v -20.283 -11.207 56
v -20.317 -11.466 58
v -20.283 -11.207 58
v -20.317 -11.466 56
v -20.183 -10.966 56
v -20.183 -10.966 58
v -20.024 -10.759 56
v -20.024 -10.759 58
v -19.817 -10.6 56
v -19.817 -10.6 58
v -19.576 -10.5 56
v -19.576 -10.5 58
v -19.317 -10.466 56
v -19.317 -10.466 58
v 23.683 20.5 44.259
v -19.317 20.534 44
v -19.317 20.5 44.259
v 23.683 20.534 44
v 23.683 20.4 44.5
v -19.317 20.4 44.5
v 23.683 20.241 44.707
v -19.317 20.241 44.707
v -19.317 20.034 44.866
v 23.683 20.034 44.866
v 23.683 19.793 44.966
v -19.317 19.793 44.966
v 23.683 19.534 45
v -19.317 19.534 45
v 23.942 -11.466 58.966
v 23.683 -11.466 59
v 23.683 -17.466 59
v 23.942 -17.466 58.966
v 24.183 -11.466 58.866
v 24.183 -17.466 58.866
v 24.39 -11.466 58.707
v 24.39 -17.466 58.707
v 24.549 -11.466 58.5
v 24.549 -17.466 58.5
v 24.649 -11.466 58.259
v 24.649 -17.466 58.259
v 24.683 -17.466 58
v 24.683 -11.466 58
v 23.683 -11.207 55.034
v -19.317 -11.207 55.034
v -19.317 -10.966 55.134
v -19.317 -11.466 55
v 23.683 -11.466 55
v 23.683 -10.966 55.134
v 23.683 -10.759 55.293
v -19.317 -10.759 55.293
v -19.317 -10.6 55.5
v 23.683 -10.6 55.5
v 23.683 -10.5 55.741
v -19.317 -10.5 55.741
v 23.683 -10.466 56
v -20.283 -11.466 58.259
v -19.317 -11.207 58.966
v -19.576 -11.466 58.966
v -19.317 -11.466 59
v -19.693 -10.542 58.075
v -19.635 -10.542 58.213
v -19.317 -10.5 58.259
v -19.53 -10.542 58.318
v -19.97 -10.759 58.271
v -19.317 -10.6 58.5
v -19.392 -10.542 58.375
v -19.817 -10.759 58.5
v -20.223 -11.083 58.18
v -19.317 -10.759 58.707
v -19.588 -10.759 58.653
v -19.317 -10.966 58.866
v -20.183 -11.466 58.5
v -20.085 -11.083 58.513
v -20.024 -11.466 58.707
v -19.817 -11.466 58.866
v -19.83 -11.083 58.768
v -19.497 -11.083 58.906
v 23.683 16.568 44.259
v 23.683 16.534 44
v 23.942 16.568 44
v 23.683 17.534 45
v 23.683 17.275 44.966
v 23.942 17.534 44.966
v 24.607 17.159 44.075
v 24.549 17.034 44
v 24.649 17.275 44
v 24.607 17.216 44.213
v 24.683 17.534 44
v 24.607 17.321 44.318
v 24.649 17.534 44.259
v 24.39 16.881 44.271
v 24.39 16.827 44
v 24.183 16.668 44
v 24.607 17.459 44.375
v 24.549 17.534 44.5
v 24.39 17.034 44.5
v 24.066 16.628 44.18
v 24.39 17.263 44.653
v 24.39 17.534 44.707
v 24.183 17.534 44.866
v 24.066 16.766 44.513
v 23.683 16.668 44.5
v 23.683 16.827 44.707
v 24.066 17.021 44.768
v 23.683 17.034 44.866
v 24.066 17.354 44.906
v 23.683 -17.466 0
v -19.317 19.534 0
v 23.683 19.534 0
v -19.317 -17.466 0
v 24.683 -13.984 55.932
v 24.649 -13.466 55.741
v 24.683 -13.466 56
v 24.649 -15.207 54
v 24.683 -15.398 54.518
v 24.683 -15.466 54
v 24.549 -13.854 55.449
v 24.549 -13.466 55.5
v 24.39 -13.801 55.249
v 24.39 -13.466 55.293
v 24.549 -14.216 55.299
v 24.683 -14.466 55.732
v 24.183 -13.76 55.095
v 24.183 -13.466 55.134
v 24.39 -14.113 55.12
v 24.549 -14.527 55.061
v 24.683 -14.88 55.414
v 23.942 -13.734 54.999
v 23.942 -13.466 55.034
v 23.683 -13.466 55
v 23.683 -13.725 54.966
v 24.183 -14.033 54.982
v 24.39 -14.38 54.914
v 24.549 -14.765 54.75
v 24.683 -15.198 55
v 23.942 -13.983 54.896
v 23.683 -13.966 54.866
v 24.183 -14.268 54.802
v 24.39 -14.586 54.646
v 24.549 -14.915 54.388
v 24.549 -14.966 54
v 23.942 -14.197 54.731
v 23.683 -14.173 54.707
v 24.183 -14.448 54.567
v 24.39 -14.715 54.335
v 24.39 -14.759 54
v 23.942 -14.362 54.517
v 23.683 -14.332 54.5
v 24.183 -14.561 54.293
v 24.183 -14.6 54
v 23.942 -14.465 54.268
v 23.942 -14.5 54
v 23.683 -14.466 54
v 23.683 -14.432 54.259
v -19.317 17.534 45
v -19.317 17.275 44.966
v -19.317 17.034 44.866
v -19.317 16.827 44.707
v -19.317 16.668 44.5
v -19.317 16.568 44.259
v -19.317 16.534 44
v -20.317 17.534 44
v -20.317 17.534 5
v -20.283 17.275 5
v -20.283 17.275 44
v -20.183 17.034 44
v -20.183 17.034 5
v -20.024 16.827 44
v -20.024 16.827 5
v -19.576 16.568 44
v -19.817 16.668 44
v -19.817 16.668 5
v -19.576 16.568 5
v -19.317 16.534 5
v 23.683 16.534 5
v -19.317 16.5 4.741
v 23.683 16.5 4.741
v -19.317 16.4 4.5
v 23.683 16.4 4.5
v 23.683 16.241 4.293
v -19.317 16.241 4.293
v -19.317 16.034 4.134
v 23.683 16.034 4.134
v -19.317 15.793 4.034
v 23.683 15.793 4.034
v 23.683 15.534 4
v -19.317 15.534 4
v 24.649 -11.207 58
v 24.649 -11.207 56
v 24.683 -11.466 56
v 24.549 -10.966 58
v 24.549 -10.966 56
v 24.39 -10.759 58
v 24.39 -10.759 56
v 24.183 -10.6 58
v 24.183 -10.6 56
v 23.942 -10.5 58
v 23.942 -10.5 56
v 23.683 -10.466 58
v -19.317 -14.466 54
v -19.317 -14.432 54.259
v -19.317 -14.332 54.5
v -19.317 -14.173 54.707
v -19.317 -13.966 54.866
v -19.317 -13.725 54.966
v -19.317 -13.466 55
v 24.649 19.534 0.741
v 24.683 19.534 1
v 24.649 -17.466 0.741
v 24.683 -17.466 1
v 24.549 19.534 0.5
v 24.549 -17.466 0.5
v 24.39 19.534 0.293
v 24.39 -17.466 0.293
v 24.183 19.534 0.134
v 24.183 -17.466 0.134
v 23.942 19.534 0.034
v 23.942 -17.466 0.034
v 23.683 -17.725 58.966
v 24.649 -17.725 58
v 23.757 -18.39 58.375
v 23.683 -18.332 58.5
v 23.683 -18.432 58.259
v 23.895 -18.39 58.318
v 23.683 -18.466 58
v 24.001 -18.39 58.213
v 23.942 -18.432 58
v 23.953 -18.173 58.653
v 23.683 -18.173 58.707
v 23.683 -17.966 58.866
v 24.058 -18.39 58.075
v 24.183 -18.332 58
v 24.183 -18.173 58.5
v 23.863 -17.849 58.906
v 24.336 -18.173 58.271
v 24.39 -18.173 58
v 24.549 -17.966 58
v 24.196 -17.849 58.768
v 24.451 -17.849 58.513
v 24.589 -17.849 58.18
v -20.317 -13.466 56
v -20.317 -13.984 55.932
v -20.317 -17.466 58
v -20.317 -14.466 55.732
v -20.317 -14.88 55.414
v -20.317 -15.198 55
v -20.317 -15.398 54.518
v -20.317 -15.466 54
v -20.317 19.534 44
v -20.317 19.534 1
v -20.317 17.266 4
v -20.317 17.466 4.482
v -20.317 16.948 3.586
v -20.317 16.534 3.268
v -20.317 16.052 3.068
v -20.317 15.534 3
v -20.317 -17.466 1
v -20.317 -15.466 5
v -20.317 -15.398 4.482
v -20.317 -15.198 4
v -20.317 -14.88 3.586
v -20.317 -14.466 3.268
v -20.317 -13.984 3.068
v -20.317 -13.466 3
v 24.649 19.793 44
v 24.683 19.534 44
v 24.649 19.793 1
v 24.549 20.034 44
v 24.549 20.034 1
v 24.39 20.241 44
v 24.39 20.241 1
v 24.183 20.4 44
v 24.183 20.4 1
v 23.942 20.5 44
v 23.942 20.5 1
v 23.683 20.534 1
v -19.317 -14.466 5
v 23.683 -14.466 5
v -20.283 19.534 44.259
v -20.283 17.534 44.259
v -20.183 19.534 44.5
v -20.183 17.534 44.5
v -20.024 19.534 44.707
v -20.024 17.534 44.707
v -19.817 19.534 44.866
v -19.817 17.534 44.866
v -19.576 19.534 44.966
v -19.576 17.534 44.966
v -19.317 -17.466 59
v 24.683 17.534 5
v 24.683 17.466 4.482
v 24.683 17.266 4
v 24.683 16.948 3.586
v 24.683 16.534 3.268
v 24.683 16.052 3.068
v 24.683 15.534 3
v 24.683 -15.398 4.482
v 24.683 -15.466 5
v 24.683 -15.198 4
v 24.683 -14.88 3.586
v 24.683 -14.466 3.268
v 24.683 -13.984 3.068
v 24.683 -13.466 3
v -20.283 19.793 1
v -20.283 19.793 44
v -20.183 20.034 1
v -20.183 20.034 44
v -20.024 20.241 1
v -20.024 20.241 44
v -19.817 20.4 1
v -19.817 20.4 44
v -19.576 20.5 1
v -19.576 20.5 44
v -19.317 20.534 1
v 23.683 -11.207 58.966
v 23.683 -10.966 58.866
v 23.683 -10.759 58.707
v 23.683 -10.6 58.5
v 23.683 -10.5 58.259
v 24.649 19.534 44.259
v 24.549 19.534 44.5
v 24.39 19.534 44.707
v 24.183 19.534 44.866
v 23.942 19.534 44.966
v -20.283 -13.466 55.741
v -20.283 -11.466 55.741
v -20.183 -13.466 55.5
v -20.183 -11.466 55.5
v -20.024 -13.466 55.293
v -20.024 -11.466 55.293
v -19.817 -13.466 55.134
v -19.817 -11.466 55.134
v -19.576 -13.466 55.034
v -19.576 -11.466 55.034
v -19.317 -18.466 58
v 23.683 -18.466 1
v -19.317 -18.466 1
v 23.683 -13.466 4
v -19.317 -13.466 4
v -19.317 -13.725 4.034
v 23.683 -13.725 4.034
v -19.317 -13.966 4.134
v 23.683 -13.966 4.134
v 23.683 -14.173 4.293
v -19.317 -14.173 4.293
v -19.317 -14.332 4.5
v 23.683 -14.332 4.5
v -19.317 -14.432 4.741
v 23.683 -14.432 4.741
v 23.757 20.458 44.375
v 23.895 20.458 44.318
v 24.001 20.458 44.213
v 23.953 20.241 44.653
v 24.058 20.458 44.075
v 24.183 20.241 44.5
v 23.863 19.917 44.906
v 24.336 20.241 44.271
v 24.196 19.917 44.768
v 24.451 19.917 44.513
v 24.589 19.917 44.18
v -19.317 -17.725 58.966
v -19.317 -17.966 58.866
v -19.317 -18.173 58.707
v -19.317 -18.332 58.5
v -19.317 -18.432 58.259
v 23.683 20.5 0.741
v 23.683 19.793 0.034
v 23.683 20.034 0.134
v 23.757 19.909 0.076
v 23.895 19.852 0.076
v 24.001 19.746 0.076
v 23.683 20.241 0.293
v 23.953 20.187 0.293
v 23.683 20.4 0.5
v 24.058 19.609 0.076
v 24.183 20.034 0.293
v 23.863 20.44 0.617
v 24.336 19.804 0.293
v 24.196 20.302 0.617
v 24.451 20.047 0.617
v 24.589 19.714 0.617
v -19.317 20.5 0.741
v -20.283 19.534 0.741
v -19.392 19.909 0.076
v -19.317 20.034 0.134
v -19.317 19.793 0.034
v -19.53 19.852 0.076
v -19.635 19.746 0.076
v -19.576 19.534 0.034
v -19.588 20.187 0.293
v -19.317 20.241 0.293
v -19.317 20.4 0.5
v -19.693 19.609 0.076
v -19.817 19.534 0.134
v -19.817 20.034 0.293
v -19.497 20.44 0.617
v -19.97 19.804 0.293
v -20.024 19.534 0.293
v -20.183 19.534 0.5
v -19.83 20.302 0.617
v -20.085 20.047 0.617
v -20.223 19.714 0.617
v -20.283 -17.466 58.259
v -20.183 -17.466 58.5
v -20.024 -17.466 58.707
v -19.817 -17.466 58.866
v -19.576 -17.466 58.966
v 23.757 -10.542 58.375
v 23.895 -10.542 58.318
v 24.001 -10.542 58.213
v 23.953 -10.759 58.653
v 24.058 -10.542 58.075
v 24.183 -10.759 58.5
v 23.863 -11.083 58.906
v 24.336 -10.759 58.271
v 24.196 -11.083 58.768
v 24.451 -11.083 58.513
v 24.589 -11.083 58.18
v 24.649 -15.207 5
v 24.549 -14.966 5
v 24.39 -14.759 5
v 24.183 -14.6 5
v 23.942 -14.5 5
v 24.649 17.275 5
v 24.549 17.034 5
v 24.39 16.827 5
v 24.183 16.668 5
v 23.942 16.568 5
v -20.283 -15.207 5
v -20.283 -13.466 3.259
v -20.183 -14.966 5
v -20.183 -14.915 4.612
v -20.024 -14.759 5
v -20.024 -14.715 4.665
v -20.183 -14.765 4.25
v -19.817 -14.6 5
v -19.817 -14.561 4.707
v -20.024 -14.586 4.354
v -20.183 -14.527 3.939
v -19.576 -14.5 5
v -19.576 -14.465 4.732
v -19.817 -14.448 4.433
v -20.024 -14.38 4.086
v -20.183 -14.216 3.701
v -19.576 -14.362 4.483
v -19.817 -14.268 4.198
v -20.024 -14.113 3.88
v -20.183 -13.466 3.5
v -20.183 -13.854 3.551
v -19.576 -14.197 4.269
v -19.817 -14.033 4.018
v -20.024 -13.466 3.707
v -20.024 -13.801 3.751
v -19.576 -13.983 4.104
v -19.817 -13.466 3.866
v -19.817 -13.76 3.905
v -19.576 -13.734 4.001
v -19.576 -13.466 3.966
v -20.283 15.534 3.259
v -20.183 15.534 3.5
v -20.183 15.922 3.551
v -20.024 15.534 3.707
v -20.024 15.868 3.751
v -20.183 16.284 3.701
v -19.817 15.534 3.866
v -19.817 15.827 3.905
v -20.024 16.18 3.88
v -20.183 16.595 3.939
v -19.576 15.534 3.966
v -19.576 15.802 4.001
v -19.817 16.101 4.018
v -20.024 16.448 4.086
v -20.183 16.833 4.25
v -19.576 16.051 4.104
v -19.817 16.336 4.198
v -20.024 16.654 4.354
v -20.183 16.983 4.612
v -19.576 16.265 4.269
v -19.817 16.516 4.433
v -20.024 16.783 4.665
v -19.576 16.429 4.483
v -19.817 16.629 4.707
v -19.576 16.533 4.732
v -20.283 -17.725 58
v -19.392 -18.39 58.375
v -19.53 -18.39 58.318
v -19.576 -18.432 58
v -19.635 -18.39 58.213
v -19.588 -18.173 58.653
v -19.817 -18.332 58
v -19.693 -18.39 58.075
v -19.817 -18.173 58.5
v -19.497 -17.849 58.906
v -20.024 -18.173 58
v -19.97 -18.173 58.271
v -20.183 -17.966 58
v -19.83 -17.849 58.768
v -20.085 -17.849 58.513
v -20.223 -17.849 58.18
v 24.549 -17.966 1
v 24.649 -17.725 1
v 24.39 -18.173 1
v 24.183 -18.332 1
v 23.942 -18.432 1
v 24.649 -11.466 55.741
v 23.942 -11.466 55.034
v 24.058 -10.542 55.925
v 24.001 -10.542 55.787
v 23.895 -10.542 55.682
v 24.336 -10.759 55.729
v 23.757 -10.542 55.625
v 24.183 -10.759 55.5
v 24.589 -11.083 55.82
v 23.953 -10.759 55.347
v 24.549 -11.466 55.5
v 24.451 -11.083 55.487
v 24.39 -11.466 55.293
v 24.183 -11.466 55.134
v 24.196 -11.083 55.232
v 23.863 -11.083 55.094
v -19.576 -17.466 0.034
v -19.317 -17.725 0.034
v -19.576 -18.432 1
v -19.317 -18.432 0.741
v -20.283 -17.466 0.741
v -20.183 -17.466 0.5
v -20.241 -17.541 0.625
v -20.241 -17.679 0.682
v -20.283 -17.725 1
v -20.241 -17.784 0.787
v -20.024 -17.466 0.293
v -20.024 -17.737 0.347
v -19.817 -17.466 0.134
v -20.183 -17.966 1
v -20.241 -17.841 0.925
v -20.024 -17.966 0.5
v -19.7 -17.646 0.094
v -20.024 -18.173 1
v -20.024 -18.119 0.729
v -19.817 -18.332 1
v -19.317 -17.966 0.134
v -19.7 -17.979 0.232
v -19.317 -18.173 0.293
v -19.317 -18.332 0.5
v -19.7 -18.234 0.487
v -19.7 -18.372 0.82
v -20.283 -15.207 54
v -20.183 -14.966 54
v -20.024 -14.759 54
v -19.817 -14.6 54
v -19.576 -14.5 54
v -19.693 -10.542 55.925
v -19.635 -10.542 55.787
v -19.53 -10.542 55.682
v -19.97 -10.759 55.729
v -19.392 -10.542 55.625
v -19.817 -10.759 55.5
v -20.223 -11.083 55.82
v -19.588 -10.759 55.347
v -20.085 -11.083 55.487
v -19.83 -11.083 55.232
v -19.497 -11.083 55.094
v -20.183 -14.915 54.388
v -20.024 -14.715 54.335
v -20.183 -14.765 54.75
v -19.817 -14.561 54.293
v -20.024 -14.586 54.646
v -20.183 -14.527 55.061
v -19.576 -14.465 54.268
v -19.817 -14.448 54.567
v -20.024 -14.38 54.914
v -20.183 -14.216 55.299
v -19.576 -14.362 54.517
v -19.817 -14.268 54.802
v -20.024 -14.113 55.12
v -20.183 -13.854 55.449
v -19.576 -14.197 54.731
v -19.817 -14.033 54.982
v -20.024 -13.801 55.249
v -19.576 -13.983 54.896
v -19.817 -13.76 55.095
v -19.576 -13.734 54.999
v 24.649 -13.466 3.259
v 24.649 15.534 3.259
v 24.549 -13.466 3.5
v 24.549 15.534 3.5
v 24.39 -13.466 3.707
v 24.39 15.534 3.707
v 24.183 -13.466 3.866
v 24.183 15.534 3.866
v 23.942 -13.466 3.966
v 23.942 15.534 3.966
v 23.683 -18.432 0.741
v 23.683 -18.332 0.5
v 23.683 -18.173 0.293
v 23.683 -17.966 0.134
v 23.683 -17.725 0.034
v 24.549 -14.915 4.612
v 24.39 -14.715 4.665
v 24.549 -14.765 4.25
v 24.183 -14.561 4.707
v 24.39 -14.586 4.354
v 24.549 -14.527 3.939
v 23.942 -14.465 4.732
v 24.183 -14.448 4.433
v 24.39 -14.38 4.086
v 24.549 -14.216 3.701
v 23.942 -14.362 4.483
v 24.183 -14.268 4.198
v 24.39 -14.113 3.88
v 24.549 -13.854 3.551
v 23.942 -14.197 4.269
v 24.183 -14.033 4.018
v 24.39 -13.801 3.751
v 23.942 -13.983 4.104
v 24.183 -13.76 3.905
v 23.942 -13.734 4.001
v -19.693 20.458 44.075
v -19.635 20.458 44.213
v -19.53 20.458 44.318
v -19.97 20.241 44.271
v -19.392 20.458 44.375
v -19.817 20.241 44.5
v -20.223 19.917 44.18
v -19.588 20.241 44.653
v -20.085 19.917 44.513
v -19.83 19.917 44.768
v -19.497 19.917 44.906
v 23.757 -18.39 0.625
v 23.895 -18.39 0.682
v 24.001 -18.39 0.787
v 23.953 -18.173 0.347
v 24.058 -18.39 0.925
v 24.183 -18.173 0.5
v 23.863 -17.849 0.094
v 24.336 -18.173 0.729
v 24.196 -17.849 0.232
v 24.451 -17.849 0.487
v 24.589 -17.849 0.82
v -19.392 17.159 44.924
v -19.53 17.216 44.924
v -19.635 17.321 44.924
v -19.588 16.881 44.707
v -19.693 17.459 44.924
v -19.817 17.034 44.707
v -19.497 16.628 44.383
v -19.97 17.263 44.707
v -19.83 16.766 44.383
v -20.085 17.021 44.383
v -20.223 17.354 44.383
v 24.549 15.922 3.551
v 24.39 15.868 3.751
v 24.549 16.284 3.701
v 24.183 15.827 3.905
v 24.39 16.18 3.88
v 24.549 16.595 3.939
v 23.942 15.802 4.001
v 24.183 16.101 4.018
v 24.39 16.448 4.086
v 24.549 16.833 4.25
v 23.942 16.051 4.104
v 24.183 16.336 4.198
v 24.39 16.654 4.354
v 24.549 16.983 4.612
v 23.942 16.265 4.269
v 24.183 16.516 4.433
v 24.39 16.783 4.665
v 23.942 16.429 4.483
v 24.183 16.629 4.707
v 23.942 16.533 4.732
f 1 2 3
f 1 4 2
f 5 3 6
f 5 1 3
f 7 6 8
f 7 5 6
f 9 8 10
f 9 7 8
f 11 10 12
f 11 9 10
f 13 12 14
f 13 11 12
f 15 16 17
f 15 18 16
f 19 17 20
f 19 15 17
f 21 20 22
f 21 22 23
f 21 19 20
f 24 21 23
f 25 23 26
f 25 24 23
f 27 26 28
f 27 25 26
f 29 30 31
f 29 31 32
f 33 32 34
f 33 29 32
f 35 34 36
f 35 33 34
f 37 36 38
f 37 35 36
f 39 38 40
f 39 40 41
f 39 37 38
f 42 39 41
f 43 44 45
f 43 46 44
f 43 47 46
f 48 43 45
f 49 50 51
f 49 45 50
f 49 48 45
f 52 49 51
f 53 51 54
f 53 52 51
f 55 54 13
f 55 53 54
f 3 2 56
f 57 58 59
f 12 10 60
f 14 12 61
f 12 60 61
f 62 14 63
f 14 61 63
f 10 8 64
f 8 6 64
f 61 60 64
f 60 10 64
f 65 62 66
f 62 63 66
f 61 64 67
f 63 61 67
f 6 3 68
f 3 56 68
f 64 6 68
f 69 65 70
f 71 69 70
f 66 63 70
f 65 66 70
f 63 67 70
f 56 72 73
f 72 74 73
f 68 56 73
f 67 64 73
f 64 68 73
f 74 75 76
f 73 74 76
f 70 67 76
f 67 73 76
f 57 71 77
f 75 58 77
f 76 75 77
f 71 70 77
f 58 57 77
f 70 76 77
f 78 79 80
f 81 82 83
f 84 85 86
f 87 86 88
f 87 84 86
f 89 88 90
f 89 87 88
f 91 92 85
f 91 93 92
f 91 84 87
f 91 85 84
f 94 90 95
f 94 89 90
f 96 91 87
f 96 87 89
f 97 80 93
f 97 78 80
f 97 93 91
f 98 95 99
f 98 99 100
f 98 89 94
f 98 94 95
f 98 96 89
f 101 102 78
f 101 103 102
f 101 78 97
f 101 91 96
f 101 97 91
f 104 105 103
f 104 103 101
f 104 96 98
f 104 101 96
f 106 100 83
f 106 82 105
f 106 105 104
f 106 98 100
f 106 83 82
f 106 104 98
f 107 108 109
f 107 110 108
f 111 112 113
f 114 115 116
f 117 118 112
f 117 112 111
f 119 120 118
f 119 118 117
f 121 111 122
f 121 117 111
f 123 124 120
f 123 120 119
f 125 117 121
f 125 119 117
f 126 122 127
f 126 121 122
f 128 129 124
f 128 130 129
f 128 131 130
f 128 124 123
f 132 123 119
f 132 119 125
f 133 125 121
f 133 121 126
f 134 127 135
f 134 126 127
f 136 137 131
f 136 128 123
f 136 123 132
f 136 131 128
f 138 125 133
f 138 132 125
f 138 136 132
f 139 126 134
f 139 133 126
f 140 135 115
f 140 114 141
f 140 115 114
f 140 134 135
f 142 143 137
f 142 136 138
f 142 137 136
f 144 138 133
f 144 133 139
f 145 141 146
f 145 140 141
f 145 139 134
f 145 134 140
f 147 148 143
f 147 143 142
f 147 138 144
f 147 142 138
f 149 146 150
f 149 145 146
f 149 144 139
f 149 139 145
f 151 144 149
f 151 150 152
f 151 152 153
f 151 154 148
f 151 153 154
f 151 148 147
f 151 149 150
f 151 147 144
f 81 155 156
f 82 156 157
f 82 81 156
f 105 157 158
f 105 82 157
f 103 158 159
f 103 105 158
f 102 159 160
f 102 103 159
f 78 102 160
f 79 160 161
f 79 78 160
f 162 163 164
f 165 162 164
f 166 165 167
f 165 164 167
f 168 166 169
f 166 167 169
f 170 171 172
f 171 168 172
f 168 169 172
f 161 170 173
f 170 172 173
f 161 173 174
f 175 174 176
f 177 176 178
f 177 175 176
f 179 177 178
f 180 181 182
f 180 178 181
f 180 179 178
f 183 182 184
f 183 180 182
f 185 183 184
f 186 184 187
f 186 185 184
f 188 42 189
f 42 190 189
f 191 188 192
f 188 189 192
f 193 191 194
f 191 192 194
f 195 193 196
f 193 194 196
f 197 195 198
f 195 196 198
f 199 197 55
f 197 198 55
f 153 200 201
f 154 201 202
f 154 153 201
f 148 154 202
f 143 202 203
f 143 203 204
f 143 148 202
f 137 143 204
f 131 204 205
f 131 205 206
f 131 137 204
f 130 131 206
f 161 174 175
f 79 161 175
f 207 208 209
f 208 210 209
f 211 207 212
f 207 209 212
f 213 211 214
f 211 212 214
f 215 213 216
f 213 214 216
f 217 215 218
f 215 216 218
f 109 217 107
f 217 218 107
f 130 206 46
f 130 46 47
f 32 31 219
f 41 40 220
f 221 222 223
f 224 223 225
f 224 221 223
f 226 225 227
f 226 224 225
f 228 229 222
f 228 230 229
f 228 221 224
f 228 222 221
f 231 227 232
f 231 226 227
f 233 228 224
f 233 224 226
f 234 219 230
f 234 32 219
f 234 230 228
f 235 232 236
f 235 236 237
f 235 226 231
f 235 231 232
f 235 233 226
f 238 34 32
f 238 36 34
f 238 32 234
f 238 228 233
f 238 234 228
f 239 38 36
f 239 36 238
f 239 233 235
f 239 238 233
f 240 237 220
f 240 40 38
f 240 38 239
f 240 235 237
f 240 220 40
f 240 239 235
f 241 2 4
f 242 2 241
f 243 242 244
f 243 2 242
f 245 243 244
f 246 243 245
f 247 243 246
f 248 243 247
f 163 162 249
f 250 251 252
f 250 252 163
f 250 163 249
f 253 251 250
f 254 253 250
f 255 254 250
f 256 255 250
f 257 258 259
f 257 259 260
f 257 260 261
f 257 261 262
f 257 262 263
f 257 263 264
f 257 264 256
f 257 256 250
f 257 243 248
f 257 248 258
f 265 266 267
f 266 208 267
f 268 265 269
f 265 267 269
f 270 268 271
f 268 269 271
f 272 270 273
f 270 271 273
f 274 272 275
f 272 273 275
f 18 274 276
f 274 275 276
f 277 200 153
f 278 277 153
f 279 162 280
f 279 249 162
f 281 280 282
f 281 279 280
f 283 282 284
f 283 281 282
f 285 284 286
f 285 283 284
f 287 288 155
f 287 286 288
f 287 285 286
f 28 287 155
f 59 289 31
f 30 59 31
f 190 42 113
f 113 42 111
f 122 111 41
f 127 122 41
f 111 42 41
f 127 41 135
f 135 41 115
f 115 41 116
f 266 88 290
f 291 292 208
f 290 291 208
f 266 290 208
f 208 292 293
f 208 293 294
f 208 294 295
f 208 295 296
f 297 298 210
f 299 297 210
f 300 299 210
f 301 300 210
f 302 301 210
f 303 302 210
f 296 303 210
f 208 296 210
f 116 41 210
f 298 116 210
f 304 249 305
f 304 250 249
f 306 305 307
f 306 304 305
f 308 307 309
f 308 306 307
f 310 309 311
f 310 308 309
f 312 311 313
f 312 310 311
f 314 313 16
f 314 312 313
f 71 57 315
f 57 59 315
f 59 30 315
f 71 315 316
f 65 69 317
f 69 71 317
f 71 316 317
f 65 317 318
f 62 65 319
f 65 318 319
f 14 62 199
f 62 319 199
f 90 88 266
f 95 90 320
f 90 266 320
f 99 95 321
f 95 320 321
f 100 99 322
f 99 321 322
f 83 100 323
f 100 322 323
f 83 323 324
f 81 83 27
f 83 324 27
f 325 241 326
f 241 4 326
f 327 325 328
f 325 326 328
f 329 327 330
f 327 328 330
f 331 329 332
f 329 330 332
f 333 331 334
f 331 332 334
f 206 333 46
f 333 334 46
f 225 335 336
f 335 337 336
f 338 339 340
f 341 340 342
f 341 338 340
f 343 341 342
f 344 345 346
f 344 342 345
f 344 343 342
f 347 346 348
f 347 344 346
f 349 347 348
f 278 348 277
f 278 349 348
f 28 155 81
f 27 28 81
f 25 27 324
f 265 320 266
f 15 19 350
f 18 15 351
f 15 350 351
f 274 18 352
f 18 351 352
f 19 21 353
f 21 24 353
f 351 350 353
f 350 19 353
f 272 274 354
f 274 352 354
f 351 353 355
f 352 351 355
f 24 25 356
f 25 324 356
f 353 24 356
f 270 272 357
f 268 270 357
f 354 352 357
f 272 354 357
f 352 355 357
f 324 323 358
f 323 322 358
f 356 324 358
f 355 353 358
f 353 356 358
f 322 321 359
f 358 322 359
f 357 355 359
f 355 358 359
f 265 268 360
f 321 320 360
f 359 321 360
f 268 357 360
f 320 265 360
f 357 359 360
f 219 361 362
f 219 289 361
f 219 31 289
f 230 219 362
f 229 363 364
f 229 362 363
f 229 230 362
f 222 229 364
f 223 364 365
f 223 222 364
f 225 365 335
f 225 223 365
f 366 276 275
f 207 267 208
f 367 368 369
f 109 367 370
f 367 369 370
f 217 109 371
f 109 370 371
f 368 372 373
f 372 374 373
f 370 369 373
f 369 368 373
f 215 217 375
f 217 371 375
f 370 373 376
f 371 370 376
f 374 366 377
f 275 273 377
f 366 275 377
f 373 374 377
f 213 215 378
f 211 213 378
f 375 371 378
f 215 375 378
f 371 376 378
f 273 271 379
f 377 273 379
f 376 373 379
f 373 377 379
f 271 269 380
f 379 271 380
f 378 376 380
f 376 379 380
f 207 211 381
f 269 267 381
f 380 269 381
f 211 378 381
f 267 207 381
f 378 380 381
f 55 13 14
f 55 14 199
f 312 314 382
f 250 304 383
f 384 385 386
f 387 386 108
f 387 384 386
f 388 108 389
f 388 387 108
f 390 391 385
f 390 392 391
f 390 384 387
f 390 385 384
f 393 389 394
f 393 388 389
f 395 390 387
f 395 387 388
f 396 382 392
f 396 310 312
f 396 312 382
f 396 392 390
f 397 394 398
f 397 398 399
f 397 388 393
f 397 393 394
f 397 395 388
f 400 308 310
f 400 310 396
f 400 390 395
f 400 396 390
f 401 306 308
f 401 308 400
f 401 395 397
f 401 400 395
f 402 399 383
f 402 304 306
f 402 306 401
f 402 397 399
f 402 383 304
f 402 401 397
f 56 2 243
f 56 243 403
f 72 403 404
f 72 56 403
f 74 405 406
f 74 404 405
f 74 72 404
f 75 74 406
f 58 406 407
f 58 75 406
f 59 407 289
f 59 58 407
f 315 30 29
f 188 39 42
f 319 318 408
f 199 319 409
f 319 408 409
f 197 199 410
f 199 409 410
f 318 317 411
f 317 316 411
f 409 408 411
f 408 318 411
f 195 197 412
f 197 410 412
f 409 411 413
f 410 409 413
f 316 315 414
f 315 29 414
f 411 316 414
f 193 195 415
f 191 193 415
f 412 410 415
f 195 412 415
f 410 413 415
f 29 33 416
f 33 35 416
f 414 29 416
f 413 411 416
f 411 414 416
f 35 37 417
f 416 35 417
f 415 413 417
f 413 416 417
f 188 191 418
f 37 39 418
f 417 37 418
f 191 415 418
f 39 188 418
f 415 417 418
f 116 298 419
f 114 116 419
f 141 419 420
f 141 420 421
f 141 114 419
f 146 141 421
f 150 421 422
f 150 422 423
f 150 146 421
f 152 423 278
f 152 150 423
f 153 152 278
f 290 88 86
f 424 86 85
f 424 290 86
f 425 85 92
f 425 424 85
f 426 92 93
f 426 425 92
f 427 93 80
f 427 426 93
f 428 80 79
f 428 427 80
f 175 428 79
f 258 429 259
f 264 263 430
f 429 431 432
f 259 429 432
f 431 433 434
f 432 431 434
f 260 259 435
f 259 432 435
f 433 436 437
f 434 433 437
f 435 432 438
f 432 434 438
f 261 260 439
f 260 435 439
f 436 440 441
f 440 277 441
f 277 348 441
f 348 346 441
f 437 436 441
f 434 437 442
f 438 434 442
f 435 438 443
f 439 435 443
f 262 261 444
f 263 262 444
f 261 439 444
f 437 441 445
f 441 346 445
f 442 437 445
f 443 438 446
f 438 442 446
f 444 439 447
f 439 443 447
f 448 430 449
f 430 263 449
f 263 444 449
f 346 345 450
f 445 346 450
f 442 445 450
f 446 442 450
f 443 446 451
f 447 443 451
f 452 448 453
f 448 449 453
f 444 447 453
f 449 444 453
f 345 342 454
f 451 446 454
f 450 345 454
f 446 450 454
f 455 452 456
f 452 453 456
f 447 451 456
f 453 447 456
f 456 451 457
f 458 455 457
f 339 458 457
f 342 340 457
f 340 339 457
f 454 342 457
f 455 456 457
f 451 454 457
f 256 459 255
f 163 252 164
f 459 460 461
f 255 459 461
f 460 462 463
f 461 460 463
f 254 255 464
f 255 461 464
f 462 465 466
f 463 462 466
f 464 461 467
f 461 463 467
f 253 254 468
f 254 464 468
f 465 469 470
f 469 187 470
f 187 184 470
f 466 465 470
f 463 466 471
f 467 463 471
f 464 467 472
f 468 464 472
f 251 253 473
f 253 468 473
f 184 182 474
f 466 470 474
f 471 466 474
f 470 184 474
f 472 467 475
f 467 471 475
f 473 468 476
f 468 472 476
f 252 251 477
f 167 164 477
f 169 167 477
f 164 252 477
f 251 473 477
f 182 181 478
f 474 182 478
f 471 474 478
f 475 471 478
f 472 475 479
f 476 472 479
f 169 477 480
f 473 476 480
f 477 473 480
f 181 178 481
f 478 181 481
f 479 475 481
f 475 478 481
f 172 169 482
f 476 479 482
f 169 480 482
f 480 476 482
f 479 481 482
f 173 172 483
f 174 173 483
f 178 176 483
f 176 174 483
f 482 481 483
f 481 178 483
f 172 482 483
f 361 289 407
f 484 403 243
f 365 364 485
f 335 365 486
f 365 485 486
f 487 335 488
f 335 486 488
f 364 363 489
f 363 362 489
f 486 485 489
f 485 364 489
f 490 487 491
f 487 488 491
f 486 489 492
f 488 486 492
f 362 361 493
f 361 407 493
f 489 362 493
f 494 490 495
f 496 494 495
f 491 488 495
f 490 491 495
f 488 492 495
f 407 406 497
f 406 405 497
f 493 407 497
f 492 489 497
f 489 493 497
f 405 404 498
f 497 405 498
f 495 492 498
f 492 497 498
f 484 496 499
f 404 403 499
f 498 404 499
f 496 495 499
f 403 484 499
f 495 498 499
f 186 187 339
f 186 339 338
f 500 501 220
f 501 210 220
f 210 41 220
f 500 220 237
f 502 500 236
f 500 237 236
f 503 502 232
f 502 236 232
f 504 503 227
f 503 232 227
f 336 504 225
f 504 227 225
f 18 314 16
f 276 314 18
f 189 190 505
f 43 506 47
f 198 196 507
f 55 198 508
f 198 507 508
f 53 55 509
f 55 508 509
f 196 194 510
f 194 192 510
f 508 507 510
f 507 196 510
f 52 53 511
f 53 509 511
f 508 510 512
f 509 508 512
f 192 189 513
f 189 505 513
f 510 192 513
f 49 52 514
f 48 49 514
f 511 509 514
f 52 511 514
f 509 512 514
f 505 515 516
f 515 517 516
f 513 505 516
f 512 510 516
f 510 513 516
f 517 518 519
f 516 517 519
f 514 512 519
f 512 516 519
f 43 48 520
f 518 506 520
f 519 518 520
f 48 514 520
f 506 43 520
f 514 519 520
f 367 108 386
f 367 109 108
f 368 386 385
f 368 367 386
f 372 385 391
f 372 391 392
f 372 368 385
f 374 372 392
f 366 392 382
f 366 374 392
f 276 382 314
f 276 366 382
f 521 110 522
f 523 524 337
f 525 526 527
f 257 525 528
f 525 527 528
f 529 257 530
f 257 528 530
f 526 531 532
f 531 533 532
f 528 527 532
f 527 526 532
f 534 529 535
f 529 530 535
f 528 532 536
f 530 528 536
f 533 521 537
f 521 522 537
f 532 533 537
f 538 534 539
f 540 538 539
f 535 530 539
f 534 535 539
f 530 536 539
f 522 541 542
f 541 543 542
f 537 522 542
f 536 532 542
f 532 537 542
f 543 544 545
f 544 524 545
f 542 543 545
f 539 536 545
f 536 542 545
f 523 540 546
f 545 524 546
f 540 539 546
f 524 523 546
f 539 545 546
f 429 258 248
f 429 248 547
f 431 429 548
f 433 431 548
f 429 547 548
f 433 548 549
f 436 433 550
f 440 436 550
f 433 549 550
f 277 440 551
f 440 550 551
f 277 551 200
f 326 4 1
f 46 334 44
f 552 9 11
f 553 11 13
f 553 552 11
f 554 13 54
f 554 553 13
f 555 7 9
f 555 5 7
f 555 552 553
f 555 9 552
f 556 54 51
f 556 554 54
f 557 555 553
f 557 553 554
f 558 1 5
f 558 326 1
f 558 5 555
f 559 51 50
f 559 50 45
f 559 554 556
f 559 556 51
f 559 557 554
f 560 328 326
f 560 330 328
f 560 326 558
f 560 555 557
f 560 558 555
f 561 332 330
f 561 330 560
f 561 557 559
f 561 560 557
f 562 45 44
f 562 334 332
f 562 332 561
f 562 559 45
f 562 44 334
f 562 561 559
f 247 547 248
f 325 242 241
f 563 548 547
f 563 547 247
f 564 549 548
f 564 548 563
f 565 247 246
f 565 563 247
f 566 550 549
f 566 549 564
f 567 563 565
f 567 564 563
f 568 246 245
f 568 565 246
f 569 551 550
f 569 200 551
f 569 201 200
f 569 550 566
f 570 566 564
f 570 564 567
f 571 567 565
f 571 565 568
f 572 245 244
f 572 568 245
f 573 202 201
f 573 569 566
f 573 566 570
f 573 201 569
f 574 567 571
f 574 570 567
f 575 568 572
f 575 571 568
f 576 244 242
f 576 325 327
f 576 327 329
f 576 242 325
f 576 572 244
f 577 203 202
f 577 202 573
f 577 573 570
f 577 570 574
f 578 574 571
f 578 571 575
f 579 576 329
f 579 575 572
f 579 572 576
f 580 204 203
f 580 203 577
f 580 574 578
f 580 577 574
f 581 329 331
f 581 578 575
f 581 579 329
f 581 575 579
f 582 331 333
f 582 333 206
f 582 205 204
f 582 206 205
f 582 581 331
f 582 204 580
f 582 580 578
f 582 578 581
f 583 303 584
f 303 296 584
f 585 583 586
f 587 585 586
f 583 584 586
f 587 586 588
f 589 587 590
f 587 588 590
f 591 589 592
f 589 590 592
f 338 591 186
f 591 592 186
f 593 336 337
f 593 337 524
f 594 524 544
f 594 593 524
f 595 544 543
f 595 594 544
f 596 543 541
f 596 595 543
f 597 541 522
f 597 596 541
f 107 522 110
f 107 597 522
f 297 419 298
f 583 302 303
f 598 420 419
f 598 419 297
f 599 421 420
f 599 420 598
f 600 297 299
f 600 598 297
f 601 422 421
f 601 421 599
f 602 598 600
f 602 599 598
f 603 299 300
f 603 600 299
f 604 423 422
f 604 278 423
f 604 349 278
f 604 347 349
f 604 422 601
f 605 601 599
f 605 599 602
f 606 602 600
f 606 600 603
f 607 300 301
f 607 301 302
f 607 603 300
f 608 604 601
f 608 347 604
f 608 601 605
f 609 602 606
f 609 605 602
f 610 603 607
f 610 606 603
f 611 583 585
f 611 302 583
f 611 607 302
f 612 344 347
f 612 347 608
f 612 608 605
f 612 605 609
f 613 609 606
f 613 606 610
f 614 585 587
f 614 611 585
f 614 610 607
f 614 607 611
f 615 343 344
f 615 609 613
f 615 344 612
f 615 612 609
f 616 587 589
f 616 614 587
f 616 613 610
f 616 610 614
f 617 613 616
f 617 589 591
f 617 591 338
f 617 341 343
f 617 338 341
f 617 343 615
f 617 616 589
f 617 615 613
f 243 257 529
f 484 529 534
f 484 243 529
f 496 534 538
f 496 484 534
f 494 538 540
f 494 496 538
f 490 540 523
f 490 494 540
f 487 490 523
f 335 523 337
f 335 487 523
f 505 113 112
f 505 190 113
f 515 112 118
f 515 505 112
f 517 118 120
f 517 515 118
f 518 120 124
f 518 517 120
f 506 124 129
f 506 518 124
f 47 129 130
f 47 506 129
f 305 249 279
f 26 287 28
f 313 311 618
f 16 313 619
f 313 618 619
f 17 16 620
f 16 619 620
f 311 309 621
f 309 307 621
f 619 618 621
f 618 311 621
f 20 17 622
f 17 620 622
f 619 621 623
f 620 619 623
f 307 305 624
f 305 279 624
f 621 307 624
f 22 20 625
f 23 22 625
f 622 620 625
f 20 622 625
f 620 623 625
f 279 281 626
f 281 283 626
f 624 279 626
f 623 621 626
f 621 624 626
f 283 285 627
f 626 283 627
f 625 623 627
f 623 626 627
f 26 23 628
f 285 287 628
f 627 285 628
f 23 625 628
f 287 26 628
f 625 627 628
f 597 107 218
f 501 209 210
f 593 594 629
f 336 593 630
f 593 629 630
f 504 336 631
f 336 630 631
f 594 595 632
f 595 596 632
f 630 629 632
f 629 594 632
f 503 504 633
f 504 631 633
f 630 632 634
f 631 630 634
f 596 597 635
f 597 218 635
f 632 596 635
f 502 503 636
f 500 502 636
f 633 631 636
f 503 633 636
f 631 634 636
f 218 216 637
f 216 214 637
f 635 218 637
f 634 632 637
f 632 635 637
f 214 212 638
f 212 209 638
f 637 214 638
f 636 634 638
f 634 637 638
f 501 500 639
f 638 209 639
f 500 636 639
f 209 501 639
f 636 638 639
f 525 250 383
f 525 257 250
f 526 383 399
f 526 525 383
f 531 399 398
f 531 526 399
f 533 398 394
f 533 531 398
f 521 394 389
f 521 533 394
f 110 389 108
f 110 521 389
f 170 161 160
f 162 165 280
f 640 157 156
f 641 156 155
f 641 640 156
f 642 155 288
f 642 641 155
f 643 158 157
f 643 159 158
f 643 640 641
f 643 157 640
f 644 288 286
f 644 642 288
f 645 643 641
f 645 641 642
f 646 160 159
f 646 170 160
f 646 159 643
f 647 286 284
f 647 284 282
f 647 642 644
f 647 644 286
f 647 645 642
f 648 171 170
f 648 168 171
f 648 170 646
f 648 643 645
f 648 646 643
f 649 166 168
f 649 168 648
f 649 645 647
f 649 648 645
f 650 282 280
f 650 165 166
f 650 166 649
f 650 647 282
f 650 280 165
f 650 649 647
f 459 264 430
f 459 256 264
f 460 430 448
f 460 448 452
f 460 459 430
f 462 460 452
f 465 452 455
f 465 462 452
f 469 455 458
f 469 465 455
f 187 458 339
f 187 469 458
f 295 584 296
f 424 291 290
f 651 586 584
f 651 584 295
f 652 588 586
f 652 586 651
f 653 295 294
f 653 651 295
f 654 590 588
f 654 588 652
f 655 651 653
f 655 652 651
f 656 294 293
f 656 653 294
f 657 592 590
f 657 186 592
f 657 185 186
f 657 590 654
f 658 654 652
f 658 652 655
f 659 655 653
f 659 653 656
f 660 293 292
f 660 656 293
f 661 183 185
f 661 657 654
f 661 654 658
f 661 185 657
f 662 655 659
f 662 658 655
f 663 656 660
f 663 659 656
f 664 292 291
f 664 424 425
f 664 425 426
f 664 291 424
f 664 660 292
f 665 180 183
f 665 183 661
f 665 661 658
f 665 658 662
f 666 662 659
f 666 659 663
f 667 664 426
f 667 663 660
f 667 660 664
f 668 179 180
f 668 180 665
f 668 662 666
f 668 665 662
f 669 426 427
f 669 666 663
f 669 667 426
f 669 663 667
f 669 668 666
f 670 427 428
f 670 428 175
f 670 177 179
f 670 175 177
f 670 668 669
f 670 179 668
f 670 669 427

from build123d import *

# Parameters (mm, degrees)
ESBO_O1_W                = 45
ESBO_O1_H                = 35
RESSALTO_EXTRUS_O1_DEPTH = 4
ESBO_O2_W                = 45
ESBO_O2_H                = 45
RESSALTO_EXTRUS_O2_DEPTH = 4
ESBO_O3_W                = 45
ESBO_O3_H                = 4
RESSALTO_EXTRUS_O3_DEPTH = 55
ESBO_O4_W                = 45
ESBO_O4_H                = 4
RESSALTO_EXTRUS_O4_DEPTH = 4
FILETE1_R                = 1


with BuildPart() as part:
    # Esboço1 → Ressalto-extrusão1 (new body)
    with BuildSketch(Plane.XY):
        with Locations((2.182824508, -0.966135458)):
            Rectangle(ESBO_O1_W, ESBO_O1_H)
    extrude(amount=RESSALTO_EXTRUS_O1_DEPTH)

    # Esboço2 → Ressalto-extrusão2 (add)
    with BuildSketch(Plane(origin=(0, 16.533864542, 0), x_dir=(1, 0, 0), z_dir=(0, 1, 0))):
        with Locations((2.182824508, -22.5)):
            Rectangle(ESBO_O2_W, ESBO_O2_H)
    extrude(amount=RESSALTO_EXTRUS_O2_DEPTH)

    # Esboço3 → Ressalto-extrusão3 (add)
    with BuildSketch(Plane.XY.offset(4)):
        with Locations((2.182824508, -16.466135458)):
            Rectangle(ESBO_O3_W, ESBO_O3_H)
    extrude(amount=RESSALTO_EXTRUS_O3_DEPTH)

    # Esboço4 → Ressalto-extrusão4 (add)
    with BuildSketch(Plane(origin=(0, -14.466135458, 0), x_dir=(1, 0, 0), z_dir=(0, 1, 0))):
        with Locations((2.182824508, -57)):
            Rectangle(ESBO_O4_W, ESBO_O4_H)
    extrude(amount=RESSALTO_EXTRUS_O4_DEPTH)

    # Filete1
    filete1_edges = [part.edges().sort_by_distance(p)[0] for p in [
        (-20.317175492, 16.533864542, 24.5),
        (2.182824508, 16.533864542, 45),
        (-20.317175492, 18.533864542, 45),
        (24.682824508, 16.533864542, 24.5),
        (24.682824508, 18.533864542, 45),
        (2.182824508, 16.533864542, 4),
        (-20.317175492, 20.533864542, 22.5),
        (2.182824508, 20.533864542, 45),
        (24.682824508, 20.533864542, 22.5),
        (2.182824508, 20.533864542, 0),
        (24.682824508, 1.033864542, 4),
        (2.182824508, -14.466135458, 4),
        (24.682824508, -14.466135458, 59),
        (-20.317175492, -14.466135458, 59),
        (2.182824508, -18.466135458, 59),
        (-20.317175492, -14.466135458, 29.5),
        (24.682824508, -14.466135458, 29.5),
        (-20.317175492, -12.466135458, 55),
        (2.182824508, -14.466135458, 55),
        (24.682824508, -12.466135458, 55),
        (-20.317175492, -10.466135458, 57),
        (2.182824508, -10.466135458, 59),
        (24.682824508, -10.466135458, 57),
        (2.182824508, -10.466135458, 55),
        (-20.317175492, 1.033864542, 4),
        (24.682824508, 1.033864542, 0),
        (2.182824508, -18.466135458, 0),
        (-20.317175492, 1.033864542, 0),
        (24.682824508, -18.466135458, 29.5),
        (-20.317175492, -18.466135458, 29.5),
    ]]
    fillet(filete1_edges, radius=FILETE1_R)


solid = part.part
